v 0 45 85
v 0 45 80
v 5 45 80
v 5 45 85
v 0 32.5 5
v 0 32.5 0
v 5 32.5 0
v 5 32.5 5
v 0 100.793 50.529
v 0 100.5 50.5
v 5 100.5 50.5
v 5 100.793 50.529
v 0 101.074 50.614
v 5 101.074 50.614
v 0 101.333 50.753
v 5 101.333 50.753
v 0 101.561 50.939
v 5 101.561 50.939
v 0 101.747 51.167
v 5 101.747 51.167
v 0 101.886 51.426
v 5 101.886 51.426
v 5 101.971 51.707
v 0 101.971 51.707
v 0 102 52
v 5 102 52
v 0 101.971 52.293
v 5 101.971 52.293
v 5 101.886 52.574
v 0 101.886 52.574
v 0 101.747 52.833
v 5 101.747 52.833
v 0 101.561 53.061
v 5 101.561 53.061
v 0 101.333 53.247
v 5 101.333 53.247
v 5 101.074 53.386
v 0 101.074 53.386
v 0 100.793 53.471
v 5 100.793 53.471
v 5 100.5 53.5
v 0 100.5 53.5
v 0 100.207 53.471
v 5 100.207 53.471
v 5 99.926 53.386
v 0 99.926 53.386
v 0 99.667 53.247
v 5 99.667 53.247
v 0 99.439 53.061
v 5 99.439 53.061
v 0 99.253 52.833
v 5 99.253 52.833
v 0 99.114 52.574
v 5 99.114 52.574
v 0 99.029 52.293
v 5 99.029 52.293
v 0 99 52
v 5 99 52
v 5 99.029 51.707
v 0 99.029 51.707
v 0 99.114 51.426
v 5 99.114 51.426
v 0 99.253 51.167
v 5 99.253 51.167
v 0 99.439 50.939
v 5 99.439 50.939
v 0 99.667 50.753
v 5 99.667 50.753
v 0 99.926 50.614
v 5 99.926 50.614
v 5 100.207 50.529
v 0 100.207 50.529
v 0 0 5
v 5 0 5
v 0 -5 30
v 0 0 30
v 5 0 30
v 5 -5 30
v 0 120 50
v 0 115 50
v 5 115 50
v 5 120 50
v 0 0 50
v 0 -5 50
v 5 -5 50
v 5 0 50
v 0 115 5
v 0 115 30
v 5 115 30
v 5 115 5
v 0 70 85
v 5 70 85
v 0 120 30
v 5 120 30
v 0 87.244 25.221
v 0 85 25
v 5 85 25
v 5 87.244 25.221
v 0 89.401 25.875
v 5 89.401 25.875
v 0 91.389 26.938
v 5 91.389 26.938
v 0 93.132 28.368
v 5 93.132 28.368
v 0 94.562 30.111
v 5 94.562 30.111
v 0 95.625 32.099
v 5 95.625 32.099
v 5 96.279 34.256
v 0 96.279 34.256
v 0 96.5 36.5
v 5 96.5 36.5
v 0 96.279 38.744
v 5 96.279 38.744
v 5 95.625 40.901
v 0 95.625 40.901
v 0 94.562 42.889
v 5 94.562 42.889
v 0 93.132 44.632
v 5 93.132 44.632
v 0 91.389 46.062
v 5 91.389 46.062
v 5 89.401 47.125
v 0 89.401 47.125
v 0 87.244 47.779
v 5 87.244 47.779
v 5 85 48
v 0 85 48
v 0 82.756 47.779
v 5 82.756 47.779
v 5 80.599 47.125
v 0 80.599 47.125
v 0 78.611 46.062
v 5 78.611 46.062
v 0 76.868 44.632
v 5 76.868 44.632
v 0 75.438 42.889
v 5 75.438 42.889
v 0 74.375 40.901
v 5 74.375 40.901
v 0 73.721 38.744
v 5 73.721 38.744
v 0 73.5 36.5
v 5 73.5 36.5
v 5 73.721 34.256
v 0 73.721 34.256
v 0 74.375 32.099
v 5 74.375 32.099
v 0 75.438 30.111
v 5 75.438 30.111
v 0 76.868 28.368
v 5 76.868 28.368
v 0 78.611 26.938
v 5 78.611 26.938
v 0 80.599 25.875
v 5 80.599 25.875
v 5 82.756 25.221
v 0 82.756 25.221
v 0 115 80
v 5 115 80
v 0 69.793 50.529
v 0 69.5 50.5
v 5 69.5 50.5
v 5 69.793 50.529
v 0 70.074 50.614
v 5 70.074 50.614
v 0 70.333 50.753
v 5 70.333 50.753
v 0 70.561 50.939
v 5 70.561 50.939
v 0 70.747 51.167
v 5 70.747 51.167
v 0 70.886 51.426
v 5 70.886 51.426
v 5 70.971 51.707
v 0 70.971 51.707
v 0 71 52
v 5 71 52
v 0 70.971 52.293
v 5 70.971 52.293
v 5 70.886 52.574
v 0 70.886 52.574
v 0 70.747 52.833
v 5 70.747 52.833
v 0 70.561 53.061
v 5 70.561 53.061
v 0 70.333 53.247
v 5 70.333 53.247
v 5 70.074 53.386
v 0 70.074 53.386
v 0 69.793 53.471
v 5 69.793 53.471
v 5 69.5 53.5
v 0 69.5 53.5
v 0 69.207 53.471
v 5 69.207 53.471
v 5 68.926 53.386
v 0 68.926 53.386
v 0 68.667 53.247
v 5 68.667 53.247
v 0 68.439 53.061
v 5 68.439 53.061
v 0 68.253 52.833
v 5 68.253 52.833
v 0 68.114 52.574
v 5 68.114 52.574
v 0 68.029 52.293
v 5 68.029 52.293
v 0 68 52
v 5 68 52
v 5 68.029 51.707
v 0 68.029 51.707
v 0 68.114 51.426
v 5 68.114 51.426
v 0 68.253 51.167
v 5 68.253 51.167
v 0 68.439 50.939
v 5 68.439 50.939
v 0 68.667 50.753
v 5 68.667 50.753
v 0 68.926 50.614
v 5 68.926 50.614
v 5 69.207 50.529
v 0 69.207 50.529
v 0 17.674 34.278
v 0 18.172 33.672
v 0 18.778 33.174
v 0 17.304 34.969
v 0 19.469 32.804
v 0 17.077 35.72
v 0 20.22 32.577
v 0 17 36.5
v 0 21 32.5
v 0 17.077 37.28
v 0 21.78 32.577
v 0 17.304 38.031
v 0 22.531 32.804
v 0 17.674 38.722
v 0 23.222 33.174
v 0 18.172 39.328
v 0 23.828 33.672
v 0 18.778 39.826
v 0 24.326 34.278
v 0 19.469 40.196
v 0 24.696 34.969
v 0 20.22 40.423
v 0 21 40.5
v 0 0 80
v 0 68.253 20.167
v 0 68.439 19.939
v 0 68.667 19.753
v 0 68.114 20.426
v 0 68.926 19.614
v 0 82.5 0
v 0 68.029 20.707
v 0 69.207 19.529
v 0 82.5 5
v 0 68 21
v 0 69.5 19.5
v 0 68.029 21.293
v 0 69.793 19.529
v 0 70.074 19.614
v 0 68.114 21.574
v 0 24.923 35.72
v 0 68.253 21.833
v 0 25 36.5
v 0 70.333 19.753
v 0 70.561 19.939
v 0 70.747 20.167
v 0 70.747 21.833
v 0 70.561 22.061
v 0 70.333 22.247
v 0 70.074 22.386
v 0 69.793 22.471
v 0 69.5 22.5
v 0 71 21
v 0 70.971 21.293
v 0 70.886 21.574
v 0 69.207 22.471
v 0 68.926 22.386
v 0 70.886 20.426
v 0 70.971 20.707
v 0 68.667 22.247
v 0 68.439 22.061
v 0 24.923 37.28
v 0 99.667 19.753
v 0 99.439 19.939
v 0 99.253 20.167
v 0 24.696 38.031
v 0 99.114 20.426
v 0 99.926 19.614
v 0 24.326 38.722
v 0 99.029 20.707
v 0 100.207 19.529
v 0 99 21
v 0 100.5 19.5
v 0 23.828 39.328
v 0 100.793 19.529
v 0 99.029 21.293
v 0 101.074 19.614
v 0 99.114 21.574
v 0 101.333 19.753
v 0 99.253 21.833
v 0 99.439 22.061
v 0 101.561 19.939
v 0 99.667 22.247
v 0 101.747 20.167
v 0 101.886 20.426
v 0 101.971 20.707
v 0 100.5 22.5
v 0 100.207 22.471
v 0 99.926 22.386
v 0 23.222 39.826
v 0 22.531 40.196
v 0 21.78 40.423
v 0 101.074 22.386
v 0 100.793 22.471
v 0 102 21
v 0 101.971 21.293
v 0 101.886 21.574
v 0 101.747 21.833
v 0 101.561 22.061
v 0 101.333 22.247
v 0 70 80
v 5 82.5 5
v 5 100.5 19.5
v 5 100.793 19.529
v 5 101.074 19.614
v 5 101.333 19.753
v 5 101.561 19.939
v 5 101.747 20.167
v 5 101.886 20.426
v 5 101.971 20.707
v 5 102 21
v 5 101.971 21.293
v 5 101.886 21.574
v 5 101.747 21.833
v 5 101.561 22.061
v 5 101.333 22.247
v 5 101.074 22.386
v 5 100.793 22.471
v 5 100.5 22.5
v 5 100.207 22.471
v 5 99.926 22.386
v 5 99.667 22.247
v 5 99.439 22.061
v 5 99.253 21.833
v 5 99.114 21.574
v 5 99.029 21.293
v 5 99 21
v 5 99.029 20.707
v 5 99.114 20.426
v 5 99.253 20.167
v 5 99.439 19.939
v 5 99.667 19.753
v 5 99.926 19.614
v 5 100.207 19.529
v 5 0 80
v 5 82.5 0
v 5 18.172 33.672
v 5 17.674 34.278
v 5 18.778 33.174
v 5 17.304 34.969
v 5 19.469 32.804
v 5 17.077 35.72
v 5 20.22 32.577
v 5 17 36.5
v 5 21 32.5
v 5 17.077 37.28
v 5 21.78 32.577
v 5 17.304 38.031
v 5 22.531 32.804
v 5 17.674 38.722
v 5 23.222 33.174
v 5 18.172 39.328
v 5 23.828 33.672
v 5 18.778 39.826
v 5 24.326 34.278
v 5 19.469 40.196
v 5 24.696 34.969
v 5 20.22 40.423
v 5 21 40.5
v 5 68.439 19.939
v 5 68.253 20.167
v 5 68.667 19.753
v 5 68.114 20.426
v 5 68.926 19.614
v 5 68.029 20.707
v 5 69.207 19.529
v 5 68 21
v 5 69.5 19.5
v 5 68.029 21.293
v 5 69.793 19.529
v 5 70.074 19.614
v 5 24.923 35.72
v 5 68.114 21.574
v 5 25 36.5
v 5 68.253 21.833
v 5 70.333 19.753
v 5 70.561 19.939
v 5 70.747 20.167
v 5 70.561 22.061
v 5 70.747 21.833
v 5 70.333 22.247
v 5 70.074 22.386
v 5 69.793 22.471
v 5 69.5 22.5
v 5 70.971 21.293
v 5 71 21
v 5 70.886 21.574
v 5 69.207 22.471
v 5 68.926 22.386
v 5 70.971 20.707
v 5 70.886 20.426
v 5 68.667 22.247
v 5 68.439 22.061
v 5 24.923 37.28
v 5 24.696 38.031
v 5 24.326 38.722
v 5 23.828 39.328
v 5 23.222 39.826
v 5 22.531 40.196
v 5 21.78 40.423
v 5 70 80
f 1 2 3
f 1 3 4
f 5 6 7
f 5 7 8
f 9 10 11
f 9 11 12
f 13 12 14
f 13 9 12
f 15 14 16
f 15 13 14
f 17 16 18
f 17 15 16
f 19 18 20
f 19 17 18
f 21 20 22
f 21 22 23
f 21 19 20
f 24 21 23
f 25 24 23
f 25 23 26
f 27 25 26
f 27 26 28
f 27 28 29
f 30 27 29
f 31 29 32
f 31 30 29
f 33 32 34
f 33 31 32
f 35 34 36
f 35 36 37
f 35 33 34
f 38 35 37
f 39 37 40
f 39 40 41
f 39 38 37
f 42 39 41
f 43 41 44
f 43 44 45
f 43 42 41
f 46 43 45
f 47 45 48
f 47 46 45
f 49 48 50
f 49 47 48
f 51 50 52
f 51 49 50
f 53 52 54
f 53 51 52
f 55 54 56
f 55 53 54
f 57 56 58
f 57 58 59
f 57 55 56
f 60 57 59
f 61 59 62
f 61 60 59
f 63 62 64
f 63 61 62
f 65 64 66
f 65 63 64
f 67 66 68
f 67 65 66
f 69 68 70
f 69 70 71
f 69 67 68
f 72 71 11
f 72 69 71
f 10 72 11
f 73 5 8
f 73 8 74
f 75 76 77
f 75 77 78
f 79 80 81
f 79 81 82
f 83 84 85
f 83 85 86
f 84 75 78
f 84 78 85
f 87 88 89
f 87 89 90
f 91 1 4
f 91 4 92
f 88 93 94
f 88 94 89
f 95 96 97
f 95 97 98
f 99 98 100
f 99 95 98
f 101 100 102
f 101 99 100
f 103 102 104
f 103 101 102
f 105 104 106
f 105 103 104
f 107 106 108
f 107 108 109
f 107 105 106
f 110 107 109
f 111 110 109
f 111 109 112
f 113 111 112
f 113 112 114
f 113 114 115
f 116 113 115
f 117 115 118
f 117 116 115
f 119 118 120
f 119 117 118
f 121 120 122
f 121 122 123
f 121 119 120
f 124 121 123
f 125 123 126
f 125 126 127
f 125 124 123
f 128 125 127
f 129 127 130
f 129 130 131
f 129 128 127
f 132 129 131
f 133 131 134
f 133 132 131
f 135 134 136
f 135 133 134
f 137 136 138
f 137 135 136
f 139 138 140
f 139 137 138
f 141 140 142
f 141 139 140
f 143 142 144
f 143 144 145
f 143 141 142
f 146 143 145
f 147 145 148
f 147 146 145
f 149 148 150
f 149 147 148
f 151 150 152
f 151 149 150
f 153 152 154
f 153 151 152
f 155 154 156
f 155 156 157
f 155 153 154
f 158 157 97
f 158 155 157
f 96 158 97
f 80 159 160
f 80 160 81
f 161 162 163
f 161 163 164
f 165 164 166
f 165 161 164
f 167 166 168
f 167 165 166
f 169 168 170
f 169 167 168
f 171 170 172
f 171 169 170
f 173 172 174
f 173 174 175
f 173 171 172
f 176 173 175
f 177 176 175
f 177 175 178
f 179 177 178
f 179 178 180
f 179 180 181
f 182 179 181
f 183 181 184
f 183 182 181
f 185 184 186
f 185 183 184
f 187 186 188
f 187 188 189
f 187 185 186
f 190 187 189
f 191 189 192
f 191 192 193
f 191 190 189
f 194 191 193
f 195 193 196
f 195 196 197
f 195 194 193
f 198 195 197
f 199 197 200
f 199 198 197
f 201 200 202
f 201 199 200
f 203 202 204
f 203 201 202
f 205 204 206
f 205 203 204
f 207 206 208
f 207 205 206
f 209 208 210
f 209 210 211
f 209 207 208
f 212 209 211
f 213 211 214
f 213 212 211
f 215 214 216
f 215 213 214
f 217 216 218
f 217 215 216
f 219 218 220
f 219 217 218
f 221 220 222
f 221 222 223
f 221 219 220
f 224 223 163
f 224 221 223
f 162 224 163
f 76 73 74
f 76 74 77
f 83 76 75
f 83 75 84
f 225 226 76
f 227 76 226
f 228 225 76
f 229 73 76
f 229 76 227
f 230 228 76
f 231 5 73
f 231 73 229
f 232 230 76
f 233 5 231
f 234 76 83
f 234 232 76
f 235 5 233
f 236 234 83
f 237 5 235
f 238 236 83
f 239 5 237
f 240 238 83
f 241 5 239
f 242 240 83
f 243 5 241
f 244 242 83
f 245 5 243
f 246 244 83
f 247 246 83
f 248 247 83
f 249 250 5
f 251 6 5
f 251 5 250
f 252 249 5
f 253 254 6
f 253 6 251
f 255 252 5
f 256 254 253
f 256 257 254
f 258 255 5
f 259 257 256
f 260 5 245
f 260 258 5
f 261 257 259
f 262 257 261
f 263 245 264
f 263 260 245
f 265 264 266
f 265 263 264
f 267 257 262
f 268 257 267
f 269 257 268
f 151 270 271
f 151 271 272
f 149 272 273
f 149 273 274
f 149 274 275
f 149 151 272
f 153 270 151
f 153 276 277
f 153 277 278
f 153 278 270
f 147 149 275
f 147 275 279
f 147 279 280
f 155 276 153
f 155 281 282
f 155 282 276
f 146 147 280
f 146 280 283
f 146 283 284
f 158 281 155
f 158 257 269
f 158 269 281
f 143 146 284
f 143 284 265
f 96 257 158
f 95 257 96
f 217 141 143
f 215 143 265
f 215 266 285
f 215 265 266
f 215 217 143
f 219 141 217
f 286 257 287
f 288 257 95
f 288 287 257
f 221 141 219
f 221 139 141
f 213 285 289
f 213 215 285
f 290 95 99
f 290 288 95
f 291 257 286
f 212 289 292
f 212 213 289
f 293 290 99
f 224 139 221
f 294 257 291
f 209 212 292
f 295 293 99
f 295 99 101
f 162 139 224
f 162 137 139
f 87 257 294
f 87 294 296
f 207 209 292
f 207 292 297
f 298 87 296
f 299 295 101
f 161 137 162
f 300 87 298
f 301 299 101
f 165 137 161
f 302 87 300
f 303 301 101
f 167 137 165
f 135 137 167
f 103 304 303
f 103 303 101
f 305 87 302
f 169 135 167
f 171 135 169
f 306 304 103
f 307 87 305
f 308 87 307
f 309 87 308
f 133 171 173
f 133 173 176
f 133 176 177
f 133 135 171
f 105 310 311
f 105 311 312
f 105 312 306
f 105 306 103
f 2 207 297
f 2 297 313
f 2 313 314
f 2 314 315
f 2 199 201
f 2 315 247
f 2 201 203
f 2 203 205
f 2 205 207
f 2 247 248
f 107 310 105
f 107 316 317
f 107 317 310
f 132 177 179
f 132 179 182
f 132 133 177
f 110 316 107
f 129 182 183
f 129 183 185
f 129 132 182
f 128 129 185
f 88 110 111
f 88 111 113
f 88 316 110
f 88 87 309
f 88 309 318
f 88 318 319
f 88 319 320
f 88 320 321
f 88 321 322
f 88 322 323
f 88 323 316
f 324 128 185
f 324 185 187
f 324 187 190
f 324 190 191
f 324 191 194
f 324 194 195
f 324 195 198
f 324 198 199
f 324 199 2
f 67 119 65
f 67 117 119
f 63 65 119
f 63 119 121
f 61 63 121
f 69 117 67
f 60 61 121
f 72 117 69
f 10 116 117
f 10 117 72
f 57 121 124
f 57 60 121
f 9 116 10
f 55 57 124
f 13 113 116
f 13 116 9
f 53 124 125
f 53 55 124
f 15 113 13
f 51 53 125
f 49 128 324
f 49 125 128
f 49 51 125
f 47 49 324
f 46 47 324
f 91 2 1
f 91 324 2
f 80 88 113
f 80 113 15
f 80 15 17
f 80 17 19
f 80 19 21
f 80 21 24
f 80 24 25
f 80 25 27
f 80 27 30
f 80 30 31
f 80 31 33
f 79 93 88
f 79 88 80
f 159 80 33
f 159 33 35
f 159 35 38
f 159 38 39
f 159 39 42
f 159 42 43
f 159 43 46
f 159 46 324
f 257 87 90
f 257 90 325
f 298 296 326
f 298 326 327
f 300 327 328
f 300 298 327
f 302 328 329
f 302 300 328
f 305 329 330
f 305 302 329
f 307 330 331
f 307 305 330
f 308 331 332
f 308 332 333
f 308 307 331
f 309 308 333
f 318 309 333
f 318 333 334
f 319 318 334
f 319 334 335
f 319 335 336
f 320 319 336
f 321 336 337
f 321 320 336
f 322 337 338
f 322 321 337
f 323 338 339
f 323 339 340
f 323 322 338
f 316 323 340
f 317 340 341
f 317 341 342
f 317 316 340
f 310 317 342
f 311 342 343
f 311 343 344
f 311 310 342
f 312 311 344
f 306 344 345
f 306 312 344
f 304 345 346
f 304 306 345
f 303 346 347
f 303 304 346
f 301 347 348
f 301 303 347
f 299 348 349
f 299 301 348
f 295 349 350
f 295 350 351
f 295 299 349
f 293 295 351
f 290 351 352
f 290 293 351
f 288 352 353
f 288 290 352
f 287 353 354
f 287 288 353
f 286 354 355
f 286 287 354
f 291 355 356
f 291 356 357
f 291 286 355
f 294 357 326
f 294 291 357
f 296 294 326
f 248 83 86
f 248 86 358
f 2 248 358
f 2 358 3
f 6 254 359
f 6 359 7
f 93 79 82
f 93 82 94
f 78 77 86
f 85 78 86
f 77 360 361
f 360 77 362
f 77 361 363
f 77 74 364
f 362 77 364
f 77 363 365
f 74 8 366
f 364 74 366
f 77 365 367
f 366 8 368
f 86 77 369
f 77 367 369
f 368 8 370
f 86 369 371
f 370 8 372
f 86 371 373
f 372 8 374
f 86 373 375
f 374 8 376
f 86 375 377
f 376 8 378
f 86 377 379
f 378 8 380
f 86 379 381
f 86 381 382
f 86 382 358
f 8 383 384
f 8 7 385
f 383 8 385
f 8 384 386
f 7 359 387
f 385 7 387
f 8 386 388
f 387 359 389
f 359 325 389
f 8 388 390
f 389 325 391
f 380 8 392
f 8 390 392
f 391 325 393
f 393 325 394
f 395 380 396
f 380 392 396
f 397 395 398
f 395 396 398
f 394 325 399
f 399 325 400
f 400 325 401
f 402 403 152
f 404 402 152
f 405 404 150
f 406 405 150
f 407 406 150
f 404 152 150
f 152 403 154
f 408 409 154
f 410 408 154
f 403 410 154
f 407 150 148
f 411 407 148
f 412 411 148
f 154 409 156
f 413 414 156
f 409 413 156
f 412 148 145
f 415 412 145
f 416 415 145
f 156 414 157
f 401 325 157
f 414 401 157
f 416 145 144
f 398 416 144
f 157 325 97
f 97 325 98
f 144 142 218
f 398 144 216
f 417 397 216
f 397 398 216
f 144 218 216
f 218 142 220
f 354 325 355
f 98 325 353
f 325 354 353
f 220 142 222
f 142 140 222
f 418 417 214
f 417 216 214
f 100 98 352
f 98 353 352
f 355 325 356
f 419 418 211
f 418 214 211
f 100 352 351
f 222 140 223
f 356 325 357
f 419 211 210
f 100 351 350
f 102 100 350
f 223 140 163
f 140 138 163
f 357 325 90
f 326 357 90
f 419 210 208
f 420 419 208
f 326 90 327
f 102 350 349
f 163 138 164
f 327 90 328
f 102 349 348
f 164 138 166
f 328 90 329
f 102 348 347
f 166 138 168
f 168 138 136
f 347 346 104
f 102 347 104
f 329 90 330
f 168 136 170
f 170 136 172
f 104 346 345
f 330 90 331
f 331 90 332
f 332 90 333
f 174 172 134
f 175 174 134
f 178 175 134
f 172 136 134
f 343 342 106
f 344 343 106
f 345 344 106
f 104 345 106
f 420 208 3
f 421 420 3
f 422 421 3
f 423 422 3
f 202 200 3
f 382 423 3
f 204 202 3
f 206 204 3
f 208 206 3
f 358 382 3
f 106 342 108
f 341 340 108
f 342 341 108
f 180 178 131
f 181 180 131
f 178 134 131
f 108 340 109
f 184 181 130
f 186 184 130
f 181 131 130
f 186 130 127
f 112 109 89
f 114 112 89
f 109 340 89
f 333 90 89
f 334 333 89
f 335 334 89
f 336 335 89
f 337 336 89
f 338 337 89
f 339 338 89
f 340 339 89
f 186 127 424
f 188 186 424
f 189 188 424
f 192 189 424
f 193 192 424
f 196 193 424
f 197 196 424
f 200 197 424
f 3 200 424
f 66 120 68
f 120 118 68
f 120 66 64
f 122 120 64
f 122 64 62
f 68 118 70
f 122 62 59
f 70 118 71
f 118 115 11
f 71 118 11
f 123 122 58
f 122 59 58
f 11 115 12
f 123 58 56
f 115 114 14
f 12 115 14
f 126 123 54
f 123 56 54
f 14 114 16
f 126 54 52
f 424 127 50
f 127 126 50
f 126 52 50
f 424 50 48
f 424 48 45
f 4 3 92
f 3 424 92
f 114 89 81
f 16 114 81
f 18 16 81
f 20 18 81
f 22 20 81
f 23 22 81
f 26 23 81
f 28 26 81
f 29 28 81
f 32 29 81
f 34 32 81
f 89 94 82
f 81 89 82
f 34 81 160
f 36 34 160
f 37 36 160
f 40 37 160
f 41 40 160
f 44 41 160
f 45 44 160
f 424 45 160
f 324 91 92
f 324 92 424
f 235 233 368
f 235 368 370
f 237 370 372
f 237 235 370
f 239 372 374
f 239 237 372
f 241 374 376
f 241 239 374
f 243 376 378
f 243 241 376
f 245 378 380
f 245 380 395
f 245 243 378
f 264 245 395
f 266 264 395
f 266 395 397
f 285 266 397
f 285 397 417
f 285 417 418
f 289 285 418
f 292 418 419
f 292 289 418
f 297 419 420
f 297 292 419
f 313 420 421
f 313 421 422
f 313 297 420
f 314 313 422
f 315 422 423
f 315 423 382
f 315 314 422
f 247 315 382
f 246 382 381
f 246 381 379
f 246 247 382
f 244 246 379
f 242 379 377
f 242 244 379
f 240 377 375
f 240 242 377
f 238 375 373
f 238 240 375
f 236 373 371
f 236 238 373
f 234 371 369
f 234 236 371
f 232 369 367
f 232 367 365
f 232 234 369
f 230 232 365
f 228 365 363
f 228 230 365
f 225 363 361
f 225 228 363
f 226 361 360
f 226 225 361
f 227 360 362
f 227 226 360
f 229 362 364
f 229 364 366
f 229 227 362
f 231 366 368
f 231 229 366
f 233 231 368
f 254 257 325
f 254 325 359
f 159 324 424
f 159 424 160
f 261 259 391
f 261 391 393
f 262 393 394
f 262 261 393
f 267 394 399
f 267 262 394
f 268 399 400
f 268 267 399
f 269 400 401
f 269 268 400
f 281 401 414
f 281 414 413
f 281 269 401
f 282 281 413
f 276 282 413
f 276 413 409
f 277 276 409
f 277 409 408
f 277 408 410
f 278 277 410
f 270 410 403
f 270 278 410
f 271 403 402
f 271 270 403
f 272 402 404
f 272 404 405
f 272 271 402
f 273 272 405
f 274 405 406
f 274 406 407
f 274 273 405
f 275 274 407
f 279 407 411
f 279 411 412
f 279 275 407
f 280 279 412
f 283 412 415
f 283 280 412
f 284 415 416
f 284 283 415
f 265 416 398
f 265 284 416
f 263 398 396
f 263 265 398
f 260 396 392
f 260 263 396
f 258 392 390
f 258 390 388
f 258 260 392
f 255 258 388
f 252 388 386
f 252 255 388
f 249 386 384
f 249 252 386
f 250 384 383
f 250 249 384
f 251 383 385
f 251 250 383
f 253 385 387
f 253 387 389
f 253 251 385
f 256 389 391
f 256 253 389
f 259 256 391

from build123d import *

# Parameters (mm, degrees)
SKETCH_1_R      = 4
SKETCH_1_R_2    = 11.5
SKETCH_1_R_3    = 1.5
EXTRUDE_1_DEPTH = 5


with BuildPart() as part:
    # 草图1 → 凸台-拉伸1 (new body)
    with BuildSketch(Plane(origin=(0, 0, 0), x_dir=(0, 0, -1), z_dir=(1, 0, 0))):
        Polygon((-80, 70), (-80, 115), (-50, 115), (-50, 120), (-30, 120), (-30, 115), (-5, 115), (-5, 82.5), (0, 82.5), (0, 32.5), (-5, 32.5), (-5, 0), (-30, 0), (-30, -5), (-50, -5), (-50, 0), (-80, 0), (-80, 45), (-85, 45), (-85, 70), align=None)
        with Locations((-36.5, 21)):
            Circle(SKETCH_1_R, mode=Mode.SUBTRACT)
        with Locations((-36.5, 85)):
            Circle(SKETCH_1_R_2, mode=Mode.SUBTRACT)
        with Locations((-52, 100.5)):
            Circle(SKETCH_1_R_3, mode=Mode.SUBTRACT)
        with Locations((-21, 100.5)):
            Circle(SKETCH_1_R_3, mode=Mode.SUBTRACT)
        with Locations((-21, 69.5)):
            Circle(SKETCH_1_R_3, mode=Mode.SUBTRACT)
        with Locations((-52, 69.5)):
            Circle(SKETCH_1_R_3, mode=Mode.SUBTRACT)
    extrude(amount=EXTRUDE_1_DEPTH)


solid = part.part
